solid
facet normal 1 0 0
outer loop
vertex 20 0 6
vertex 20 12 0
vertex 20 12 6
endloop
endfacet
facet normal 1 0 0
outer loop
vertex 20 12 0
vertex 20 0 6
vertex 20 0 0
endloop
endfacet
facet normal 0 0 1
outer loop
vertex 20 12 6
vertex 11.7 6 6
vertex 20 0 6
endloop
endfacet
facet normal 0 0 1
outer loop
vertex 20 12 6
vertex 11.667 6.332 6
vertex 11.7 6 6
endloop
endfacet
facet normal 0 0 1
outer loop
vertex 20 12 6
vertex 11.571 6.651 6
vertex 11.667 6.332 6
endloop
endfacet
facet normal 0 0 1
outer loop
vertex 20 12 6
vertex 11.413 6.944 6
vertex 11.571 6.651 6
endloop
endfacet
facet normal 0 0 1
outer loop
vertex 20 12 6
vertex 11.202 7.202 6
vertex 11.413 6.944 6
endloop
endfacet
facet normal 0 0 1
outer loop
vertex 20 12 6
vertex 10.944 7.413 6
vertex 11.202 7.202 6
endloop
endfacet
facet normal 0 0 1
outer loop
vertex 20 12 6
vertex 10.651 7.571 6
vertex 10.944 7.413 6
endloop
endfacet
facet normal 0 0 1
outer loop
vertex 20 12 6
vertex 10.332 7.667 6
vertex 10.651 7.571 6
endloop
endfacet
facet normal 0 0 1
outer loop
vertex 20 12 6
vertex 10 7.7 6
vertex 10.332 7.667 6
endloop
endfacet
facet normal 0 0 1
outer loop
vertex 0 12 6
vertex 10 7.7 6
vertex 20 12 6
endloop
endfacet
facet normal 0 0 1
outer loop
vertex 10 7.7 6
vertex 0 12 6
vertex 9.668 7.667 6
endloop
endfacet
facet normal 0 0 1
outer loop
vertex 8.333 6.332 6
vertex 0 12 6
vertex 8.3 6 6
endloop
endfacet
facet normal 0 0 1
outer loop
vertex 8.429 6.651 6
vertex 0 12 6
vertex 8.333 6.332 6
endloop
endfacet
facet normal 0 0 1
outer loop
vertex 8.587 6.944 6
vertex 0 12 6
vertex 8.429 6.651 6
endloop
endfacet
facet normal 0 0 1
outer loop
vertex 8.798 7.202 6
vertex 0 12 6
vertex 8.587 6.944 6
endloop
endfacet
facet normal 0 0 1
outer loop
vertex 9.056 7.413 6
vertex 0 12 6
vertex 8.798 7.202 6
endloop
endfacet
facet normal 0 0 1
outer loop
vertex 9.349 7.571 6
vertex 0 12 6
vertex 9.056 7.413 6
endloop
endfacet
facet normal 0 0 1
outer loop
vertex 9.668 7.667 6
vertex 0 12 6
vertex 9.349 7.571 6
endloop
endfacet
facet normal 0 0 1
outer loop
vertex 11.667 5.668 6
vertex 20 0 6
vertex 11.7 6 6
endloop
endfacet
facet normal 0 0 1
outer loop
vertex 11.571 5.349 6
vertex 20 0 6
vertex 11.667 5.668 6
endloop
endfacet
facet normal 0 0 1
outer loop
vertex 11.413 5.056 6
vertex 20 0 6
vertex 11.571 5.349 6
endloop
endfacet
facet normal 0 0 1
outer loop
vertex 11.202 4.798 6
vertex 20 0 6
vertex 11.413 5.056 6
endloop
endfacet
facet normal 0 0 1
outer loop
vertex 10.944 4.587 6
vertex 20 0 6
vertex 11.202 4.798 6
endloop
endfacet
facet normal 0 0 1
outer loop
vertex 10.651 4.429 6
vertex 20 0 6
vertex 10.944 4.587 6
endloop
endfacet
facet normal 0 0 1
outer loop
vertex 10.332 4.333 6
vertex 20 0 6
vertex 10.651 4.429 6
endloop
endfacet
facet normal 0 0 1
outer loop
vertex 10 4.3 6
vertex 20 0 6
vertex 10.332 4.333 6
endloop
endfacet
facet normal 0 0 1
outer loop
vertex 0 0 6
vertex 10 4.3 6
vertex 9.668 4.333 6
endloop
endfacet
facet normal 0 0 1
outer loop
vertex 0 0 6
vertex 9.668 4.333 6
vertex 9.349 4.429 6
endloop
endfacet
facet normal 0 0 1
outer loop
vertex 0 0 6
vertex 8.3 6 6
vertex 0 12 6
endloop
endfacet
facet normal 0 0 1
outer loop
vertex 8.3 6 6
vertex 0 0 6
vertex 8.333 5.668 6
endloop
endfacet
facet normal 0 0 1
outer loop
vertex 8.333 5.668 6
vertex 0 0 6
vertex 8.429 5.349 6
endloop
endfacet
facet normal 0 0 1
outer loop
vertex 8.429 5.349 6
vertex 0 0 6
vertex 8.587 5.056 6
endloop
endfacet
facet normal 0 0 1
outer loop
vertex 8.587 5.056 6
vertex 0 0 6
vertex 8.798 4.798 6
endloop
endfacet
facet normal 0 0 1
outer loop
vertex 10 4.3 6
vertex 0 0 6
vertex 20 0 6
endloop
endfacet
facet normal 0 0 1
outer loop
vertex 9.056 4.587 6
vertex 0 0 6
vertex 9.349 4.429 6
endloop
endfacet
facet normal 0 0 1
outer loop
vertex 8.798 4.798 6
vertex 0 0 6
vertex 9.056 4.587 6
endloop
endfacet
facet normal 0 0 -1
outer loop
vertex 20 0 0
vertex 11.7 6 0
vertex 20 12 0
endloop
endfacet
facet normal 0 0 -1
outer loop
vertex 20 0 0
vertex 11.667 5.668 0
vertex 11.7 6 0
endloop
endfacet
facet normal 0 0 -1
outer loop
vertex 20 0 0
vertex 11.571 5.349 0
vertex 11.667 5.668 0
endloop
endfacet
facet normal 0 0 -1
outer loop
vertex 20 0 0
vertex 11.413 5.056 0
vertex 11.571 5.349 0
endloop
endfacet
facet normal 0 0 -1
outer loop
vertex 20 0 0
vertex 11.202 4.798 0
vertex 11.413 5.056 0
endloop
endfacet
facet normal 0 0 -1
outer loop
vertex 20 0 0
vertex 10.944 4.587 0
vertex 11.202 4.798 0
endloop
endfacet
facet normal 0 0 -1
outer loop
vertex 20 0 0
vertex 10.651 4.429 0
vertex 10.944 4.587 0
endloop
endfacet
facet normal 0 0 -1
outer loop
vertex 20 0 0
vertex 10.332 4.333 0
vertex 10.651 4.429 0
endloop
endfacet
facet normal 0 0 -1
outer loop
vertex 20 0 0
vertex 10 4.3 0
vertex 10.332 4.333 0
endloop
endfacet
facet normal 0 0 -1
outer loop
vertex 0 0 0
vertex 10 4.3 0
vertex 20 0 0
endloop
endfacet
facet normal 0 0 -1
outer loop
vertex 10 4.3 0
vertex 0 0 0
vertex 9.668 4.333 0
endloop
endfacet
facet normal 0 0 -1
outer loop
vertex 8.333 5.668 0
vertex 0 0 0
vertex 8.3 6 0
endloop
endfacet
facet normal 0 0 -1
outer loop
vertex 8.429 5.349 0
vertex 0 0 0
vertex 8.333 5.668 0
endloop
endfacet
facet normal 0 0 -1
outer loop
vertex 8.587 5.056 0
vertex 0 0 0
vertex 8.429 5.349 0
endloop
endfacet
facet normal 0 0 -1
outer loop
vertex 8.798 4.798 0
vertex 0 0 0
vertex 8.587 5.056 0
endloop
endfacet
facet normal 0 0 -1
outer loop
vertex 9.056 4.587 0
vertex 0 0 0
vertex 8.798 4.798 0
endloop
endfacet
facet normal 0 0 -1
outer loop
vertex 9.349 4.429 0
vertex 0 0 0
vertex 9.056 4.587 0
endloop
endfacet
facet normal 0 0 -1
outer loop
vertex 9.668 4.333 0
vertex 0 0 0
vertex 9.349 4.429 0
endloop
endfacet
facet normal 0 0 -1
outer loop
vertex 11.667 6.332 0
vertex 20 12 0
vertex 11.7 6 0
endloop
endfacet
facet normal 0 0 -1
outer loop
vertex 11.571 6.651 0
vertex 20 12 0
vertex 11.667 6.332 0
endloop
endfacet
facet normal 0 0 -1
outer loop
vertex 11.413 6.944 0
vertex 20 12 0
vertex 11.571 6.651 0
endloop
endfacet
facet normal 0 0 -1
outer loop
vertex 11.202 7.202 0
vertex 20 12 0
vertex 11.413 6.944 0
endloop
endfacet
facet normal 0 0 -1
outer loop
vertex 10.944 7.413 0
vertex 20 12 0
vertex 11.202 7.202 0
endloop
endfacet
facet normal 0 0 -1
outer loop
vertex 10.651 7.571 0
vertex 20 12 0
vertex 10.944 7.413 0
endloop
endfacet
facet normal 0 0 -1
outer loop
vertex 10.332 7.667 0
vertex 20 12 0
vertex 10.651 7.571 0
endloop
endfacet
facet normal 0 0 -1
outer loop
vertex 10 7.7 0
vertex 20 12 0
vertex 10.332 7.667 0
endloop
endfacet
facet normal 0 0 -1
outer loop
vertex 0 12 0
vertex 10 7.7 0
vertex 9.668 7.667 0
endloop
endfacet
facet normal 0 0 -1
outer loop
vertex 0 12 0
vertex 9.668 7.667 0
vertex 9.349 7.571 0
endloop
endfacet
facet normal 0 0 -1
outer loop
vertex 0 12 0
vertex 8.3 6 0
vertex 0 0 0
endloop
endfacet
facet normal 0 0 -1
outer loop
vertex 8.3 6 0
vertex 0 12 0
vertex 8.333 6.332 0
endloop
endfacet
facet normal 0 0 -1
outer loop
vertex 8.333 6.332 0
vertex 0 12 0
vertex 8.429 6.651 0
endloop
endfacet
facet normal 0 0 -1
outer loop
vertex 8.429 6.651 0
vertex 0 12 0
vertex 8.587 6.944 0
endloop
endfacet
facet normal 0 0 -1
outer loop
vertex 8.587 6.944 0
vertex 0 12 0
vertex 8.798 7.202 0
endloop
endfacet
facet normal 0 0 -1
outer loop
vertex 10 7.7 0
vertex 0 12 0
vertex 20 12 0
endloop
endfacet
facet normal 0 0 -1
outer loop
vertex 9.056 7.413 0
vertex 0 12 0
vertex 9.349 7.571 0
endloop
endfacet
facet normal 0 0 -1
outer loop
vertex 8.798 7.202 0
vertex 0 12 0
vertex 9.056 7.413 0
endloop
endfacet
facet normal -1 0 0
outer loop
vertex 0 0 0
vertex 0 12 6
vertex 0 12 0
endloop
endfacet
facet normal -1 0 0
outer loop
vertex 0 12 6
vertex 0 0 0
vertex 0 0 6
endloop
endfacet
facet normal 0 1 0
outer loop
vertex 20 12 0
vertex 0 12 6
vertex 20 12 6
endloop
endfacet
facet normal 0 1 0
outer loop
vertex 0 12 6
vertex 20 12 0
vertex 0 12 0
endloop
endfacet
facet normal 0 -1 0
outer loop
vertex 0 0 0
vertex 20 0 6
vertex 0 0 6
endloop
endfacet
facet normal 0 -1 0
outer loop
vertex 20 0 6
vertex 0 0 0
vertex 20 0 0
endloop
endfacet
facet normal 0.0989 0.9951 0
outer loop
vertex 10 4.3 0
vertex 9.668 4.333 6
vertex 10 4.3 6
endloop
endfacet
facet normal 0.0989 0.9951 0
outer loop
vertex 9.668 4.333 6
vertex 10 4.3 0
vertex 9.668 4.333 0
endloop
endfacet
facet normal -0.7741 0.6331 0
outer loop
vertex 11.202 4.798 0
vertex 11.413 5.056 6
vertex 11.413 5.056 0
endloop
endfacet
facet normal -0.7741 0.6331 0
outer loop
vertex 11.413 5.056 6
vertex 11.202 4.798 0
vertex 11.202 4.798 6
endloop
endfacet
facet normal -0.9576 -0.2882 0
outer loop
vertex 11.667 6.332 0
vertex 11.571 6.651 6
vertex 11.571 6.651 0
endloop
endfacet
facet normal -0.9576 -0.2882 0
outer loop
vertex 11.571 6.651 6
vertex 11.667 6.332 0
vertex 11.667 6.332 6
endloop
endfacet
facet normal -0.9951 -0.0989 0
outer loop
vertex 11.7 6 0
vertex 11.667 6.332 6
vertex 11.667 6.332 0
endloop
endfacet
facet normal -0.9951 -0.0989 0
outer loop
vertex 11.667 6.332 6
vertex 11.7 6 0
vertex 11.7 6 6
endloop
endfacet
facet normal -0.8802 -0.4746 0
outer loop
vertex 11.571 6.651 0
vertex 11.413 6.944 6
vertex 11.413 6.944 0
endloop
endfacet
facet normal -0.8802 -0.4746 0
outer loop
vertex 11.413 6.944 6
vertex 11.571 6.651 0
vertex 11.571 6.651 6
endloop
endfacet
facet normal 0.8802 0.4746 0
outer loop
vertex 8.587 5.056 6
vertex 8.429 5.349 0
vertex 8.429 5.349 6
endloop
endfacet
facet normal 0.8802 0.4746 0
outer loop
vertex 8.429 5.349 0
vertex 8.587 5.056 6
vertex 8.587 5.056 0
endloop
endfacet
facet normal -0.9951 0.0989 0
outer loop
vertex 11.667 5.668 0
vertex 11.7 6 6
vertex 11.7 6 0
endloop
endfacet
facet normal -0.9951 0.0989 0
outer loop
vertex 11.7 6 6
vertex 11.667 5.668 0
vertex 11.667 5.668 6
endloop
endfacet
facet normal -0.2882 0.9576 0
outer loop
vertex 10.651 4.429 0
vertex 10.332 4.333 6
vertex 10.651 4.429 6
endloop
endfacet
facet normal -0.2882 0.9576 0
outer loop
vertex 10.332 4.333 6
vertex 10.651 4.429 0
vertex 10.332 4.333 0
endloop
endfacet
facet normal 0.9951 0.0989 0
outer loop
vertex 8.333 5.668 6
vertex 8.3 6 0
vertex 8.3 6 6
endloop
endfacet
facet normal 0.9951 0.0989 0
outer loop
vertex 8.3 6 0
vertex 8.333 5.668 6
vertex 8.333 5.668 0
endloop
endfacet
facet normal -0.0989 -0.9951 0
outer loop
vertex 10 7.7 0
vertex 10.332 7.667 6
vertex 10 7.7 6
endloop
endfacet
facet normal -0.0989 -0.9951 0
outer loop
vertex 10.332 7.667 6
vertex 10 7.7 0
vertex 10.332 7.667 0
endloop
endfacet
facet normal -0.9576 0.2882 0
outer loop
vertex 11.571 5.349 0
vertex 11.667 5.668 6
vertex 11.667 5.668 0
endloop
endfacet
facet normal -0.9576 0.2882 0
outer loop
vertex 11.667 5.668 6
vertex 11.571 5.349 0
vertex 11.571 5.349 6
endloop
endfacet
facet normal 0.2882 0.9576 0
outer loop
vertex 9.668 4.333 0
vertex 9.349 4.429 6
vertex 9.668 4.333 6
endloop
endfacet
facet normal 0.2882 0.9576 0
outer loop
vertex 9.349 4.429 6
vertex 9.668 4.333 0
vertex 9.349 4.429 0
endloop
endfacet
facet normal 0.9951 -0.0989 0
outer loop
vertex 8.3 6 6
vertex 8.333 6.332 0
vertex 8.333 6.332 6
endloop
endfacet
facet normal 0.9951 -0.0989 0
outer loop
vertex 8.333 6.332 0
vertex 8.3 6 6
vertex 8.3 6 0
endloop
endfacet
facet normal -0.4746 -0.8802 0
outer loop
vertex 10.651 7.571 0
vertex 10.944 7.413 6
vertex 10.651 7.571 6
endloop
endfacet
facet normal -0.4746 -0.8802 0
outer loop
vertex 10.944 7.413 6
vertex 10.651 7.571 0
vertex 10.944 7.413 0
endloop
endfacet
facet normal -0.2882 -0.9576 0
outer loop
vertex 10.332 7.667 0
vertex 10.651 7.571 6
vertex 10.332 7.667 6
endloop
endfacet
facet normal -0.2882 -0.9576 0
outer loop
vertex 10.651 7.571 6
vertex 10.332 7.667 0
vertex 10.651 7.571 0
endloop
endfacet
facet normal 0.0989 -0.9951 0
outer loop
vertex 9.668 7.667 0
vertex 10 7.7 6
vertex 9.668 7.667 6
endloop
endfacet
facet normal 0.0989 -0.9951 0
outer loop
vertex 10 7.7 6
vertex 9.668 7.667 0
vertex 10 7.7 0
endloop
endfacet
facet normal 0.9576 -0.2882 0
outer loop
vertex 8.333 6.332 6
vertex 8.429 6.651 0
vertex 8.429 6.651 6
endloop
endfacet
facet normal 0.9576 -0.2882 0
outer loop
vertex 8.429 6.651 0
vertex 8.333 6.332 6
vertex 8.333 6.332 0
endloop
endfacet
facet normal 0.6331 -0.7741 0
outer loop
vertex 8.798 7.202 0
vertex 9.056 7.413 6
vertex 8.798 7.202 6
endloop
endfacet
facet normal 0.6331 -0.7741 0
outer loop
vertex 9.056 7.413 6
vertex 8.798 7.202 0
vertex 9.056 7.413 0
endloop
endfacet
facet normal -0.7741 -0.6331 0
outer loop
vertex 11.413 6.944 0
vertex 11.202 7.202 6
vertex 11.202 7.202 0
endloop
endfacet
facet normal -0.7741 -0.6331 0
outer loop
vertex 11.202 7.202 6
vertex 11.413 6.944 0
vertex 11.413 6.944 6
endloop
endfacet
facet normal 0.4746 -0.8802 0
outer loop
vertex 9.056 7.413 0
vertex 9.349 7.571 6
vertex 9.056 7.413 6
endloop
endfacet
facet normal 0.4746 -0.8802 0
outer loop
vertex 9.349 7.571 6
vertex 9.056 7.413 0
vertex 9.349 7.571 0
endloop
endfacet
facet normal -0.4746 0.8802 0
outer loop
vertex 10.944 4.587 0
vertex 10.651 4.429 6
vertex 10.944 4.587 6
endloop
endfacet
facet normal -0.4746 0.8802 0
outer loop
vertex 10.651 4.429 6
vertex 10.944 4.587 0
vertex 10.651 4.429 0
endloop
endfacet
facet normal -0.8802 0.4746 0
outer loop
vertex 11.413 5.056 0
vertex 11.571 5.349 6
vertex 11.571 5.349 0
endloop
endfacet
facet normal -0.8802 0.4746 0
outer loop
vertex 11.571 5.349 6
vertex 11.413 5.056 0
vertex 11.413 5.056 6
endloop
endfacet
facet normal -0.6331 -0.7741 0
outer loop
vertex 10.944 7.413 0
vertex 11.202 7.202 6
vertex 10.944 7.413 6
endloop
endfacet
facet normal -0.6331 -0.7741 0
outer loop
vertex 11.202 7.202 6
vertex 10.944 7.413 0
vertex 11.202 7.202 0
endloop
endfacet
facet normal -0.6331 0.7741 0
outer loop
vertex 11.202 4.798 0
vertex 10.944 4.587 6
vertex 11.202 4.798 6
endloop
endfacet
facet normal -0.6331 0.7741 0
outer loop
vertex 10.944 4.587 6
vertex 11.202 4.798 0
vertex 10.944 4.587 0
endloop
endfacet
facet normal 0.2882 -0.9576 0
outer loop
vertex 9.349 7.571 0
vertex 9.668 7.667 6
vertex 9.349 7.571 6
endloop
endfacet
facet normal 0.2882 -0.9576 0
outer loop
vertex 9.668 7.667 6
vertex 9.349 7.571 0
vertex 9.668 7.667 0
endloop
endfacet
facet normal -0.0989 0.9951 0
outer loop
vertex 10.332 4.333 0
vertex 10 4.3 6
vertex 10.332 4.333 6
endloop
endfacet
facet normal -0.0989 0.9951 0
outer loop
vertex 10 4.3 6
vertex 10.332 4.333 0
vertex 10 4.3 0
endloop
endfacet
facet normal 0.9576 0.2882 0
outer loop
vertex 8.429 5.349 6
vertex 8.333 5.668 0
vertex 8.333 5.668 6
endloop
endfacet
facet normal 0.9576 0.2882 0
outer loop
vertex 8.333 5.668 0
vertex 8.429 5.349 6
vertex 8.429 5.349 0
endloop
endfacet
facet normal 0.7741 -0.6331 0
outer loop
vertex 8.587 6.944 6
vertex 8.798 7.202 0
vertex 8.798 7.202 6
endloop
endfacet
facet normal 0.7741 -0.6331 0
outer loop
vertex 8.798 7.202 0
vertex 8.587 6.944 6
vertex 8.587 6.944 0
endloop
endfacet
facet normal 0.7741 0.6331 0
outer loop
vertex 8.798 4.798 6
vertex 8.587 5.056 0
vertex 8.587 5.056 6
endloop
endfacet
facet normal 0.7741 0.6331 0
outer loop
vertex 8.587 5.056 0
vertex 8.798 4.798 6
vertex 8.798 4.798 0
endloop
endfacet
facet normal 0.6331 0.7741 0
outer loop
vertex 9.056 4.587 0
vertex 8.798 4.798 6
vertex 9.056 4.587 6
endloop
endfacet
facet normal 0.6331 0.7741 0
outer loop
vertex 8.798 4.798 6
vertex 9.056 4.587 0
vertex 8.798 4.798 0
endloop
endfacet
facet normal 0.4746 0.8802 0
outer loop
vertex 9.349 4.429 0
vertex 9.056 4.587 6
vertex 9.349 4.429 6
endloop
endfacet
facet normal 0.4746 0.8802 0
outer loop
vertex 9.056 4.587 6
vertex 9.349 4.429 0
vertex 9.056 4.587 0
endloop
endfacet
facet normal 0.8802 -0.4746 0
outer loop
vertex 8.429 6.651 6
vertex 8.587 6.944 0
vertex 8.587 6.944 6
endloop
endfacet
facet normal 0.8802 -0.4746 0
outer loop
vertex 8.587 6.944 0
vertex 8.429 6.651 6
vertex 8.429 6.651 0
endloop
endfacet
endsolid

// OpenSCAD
// ModuDeck donor chassis study: NOT a verified ThinkPad fit.
// Millimetres. 370x240 is an unconfirmed owner measurement.
$fn=32; W=370; D=240; t=3;
module plate(w,d,h){cube([w,d,h]);}
module shell(w,d,h){difference(){cube([w,d,h]);translate([t,t,t])cube([w-2*t,d-2*t,h]);}}
module hole(x,y,h){translate([x,y,-1])cylinder(d=3.4,h=h+2);}
module rail(n){difference(){cube([n,12,6]);for(x=[10:20:n-10])hole(x,6,6);}}
module rear(){difference(){cube([W-6,3,25]);translate([W/2-23,-1,6])cube([40,5,14]);for(x=[10,W-16])translate([x,-1,12])rotate([-90,0,0])cylinder(d=3.4,h=5);}}
module tray(){difference(){shell(W,D,30);translate([3,D-4,3])cube([W-6,6,27]);for(x=[15,W-15],y=[15,D-15])hole(x,y,30);}}
difference(){cube([20,12,6]);hole(10,6,6);}
